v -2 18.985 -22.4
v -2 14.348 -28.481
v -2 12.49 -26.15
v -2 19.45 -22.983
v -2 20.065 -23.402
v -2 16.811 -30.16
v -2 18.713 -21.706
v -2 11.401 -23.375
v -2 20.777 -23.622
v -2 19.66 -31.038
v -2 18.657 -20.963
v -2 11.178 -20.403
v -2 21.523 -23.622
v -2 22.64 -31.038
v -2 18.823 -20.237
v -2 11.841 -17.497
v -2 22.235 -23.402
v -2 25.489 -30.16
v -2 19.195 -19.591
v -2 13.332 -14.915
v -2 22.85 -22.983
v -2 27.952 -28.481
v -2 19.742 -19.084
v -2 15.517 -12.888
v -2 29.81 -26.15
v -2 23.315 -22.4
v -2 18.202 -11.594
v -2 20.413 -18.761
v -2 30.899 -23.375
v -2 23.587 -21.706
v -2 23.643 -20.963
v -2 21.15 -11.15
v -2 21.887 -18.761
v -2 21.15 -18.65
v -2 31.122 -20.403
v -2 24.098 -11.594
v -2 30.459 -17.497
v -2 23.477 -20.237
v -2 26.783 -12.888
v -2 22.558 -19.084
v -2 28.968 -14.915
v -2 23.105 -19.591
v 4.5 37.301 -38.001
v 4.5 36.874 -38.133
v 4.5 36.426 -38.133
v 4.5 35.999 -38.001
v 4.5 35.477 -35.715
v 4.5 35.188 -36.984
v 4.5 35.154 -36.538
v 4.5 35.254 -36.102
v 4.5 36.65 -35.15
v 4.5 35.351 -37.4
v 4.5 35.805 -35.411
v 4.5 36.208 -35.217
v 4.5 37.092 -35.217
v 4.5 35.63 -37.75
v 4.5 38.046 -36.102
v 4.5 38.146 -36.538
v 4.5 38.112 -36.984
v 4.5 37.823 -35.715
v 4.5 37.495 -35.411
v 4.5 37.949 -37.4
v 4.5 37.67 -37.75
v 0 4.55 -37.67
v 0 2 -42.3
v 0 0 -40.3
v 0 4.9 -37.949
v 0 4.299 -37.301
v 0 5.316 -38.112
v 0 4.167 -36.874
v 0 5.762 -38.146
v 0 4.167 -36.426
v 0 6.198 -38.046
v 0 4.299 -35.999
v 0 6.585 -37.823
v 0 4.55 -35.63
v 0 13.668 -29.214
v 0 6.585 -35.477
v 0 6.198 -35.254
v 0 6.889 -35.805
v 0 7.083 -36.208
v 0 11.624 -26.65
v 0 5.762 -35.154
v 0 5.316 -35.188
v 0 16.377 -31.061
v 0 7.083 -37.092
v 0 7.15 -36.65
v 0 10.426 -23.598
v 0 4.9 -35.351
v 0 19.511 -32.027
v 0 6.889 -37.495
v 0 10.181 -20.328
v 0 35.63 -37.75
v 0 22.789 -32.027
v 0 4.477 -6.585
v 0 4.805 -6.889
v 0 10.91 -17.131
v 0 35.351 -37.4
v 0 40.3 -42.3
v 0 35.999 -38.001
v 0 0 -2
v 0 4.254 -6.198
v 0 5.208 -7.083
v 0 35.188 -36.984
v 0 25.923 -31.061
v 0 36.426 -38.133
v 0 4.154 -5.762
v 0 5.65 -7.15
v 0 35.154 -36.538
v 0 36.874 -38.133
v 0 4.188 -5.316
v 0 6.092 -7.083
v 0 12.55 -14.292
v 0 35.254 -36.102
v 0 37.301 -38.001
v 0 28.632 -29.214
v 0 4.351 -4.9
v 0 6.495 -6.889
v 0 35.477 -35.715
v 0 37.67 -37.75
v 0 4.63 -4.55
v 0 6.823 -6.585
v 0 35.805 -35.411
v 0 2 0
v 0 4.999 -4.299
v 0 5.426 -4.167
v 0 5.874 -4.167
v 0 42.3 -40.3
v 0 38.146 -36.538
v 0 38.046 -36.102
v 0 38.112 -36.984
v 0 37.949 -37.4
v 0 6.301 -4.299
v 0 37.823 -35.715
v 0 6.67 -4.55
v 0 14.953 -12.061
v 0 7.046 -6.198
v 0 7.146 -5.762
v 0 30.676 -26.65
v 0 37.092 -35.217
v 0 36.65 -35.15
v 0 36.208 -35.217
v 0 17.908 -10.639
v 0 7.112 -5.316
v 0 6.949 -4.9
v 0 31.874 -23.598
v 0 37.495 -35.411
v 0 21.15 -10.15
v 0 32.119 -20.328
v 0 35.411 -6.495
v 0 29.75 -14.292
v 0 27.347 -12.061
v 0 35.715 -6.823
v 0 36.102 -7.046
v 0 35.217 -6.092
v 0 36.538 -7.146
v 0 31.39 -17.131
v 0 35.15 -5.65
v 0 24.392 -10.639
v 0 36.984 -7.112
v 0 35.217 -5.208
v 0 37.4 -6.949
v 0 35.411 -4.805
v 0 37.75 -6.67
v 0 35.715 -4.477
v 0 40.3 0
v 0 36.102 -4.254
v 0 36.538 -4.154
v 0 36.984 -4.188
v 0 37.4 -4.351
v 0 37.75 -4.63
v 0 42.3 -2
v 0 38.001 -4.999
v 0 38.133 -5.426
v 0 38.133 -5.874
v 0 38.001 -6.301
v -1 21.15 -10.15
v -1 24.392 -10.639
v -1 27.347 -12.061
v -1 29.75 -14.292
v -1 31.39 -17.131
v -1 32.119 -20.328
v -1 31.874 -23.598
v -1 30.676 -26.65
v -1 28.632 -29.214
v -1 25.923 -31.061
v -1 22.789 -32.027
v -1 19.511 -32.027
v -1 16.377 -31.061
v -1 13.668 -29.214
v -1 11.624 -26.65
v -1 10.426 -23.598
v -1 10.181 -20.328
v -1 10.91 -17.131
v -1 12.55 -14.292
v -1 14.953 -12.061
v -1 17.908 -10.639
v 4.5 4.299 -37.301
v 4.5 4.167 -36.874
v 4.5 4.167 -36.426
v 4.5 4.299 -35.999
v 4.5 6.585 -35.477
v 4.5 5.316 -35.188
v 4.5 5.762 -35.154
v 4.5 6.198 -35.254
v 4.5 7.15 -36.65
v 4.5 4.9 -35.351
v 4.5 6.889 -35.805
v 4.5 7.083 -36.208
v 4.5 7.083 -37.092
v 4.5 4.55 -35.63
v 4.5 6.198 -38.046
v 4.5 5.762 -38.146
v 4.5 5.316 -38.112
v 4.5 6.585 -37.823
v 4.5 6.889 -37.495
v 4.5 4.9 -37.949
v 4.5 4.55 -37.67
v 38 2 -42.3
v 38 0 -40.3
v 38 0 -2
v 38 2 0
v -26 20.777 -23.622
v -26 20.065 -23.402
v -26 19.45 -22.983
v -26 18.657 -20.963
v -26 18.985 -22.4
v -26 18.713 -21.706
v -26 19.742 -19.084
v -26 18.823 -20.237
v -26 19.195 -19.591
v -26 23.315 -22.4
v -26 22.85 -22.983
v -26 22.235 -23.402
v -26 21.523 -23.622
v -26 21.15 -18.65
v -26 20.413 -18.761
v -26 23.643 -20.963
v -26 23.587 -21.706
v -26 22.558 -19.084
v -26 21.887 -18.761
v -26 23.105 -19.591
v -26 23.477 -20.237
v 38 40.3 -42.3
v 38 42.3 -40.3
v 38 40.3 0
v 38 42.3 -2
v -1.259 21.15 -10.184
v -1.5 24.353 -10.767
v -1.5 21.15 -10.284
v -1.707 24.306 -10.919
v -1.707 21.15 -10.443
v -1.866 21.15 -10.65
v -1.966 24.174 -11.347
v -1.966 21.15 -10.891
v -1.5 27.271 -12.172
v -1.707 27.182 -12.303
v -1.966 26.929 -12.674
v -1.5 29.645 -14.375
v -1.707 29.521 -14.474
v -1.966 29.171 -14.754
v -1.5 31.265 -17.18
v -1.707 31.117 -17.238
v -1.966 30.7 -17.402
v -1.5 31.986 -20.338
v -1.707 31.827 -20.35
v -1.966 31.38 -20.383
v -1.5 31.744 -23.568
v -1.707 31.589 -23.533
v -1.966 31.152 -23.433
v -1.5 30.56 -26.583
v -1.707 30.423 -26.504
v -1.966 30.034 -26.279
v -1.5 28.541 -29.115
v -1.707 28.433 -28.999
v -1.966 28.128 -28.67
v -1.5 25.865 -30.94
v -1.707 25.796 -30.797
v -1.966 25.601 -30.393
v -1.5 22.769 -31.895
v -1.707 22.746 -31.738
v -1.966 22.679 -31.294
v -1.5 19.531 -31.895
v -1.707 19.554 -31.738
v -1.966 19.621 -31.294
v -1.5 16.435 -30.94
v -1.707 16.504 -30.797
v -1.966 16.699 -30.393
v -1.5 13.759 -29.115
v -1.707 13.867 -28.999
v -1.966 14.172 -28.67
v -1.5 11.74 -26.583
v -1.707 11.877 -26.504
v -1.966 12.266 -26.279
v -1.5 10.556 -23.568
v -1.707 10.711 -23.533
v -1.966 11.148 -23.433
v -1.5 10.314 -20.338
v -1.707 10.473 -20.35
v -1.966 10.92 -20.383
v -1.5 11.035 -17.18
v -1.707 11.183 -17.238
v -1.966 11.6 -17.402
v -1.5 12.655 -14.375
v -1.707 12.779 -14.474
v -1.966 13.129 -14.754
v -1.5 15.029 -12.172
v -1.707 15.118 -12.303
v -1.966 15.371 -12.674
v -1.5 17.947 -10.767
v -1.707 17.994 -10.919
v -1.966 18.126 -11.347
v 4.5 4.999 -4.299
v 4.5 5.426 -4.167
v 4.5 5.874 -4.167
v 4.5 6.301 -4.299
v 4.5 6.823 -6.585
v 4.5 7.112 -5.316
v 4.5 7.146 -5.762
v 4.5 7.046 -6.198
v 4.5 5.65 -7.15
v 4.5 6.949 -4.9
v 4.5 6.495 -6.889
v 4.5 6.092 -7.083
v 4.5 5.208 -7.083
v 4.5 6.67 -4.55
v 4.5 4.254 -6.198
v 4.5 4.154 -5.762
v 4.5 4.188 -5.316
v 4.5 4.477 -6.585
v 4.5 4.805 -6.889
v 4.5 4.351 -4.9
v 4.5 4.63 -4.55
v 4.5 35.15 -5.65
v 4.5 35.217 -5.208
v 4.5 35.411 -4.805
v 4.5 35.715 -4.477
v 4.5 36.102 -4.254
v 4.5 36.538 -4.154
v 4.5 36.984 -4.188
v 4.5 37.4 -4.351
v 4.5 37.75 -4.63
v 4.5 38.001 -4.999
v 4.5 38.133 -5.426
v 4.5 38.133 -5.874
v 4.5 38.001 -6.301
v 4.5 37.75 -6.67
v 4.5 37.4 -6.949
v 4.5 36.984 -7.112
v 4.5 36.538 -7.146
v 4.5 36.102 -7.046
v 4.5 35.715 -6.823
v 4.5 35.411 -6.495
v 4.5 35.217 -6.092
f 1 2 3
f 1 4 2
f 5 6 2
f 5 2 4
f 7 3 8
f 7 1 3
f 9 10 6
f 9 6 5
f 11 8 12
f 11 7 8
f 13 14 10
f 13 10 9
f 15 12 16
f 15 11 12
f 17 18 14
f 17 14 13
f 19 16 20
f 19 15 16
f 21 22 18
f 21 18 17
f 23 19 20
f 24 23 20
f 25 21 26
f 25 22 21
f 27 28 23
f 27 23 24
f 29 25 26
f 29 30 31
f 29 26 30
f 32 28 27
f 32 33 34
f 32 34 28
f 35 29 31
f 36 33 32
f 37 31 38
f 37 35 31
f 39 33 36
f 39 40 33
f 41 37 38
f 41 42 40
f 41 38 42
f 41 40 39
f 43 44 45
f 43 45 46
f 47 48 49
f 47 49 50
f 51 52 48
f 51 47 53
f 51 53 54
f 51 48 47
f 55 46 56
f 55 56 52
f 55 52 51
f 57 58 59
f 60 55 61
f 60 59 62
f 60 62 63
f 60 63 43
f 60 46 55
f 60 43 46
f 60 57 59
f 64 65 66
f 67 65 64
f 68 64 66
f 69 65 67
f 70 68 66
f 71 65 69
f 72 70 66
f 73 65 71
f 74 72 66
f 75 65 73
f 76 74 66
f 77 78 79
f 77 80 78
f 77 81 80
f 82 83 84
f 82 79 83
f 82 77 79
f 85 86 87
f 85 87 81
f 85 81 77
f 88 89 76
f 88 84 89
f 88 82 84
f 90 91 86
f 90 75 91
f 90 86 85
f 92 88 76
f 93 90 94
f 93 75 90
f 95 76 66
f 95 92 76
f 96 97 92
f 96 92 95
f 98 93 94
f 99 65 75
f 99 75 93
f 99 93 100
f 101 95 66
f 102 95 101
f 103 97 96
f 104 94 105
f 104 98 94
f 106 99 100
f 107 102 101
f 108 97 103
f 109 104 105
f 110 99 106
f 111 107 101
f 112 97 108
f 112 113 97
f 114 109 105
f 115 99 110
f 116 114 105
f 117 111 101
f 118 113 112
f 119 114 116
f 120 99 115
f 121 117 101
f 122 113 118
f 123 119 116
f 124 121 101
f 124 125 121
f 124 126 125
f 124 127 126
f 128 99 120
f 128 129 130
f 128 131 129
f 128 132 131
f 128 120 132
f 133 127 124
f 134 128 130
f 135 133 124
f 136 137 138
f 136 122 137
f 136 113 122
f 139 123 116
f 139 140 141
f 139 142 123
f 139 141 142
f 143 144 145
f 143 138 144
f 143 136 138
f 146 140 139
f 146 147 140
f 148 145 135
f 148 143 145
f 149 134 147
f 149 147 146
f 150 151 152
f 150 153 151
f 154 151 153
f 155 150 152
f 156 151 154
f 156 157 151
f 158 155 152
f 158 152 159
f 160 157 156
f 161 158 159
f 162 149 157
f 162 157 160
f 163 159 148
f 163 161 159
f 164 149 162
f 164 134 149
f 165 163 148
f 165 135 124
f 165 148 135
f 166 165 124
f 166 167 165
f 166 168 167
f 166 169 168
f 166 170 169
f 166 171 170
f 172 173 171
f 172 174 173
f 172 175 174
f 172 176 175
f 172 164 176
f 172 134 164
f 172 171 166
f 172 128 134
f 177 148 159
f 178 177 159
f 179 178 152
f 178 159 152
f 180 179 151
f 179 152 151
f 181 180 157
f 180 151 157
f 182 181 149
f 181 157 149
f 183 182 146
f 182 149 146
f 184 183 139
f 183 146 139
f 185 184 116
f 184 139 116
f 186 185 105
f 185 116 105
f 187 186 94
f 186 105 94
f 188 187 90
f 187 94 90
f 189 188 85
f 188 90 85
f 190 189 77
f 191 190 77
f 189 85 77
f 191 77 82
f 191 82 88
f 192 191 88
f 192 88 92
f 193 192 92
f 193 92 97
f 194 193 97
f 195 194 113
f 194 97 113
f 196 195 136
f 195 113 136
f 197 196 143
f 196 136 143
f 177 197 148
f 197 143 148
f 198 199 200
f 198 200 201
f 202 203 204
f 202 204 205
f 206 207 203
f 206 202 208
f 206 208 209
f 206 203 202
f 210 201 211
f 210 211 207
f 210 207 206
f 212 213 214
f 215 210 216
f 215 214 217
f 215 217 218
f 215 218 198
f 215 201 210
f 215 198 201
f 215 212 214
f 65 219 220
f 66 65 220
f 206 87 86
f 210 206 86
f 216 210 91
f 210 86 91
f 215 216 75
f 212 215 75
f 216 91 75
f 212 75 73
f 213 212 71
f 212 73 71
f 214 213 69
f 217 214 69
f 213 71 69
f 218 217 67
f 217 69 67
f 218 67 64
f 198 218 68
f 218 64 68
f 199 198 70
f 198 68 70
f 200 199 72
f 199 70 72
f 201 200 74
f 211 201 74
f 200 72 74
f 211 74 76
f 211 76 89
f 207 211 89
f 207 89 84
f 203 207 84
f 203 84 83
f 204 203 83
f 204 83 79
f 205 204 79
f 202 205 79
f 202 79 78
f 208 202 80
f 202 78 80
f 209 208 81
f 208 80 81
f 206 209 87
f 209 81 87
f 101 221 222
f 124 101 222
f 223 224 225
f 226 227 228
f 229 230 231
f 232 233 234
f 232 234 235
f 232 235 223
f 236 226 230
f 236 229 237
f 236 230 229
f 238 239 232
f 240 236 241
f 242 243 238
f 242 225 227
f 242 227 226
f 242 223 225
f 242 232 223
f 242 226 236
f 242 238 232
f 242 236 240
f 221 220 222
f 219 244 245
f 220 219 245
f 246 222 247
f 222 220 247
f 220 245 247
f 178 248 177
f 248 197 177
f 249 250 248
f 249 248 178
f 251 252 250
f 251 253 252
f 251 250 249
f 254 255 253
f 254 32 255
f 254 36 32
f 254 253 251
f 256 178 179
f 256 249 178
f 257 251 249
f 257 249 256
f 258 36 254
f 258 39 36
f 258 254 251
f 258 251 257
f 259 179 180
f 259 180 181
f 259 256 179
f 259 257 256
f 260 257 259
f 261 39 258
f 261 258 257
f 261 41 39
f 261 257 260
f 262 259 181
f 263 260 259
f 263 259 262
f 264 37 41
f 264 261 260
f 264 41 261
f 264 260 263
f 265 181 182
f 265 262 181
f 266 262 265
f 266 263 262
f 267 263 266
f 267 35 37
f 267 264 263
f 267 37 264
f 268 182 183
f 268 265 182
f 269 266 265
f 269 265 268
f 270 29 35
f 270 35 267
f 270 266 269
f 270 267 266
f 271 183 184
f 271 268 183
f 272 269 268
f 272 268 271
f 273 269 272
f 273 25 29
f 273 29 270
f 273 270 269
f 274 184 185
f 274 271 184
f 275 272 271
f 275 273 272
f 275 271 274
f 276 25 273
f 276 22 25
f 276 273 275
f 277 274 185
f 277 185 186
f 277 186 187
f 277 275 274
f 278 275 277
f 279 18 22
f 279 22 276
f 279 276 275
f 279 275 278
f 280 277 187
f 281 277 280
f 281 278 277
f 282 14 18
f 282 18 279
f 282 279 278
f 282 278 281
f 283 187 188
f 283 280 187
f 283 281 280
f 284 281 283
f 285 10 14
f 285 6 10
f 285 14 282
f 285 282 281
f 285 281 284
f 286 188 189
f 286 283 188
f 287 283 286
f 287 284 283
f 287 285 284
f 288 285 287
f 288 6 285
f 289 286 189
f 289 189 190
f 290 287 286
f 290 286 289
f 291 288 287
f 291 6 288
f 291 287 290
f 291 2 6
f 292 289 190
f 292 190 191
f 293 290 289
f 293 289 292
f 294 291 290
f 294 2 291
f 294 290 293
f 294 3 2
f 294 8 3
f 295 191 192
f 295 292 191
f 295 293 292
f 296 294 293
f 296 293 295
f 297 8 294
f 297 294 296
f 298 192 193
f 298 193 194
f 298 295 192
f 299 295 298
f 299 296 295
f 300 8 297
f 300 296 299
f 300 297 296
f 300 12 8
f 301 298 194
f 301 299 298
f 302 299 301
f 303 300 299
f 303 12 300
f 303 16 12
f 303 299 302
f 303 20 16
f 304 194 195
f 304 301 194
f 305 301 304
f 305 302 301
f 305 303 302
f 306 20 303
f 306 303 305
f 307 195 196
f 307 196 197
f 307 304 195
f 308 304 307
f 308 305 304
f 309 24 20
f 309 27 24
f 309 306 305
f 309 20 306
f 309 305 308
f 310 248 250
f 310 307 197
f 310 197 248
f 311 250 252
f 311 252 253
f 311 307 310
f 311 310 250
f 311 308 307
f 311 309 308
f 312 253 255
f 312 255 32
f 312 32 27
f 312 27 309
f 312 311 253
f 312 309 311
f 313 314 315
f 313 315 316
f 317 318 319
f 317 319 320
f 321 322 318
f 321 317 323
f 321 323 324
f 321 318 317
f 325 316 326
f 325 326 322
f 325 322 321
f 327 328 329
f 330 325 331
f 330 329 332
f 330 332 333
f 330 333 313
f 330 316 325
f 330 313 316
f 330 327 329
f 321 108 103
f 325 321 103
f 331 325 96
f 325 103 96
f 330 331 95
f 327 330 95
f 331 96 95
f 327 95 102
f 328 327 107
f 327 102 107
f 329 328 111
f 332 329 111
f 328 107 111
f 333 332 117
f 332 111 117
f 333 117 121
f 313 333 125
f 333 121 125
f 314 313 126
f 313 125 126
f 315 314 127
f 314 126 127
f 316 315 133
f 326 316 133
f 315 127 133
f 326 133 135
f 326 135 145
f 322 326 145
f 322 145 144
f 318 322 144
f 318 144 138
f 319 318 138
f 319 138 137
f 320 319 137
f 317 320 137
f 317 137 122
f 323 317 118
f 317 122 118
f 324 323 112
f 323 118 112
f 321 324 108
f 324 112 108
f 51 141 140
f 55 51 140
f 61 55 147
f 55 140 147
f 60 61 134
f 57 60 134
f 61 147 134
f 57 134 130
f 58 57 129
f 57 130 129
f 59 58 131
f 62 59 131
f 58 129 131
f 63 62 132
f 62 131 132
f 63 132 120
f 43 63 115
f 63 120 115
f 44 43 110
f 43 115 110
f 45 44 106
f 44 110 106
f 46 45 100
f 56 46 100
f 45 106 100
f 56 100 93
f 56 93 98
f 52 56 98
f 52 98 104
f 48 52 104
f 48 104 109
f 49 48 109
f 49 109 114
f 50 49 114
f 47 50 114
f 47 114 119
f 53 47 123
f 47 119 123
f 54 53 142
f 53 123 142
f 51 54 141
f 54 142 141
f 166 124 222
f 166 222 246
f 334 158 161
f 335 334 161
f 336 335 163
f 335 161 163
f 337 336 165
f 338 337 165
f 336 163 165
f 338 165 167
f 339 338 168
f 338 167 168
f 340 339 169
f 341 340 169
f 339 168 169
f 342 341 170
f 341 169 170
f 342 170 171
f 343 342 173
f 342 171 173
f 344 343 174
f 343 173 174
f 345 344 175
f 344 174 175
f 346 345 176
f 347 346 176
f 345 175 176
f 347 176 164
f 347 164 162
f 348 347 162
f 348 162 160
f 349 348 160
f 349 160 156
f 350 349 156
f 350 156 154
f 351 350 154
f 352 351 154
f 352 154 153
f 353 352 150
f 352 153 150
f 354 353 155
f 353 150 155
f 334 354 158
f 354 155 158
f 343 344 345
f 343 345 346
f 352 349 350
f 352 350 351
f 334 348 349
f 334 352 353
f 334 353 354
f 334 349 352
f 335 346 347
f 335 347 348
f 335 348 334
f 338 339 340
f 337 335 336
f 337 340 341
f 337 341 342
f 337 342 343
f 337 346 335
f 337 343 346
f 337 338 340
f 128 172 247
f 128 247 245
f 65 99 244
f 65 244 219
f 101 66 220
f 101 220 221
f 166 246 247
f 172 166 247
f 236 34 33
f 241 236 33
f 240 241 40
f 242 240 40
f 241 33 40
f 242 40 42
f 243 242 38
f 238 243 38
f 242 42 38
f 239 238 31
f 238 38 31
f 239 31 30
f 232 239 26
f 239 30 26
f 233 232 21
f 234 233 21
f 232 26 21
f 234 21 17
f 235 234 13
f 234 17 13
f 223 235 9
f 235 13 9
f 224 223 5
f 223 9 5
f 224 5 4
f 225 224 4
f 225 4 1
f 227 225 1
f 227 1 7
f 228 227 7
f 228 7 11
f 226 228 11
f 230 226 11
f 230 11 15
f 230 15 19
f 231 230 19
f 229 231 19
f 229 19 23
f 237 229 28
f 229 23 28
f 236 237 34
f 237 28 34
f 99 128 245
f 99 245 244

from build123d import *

# Parameters (mm, degrees)
EXTRUDE_2_DEPTH          = 38
SKETCH_2_R               = 11
EXTRUDE_3_DEPTH          = 2
FILLET_1_R               = 1
SKETCH_3_R               = 2.5
EXTRUDE_4_DEPTH          = 24
SKETCH_4_R               = 1.5
CUT_EXTRUDE_1_DEPTH      = 4.5
PATTERN_CIRCULAR_1_COUNT = 4


with BuildPart() as part:
    # 草图1 → 凸台-拉伸2 (new body)
    with BuildSketch(Plane(origin=(0, 0, 0), x_dir=(0, 0, -1), z_dir=(1, 0, 0))):
        Polygon((0, 40.3), (2, 42.3), (40.3, 42.3), (42.3, 40.3), (42.3, 2), (40.3, 0), (2, 0), (0, 2), align=None)
    extrude(amount=EXTRUDE_2_DEPTH)

    # 草图2 → 凸台-拉伸3 (add)
    with BuildSketch(Plane.ZY):
        with Locations((-21.15, 21.15)):
            Circle(SKETCH_2_R)
    extrude(amount=EXTRUDE_3_DEPTH)

    # 圆角1
    fillet_1_edges = [part.edges().sort_by_distance(p)[0] for p in [
        (-2, 21.15, -32.15),
    ]]
    fillet(fillet_1_edges, radius=FILLET_1_R)

    # 草图3 → 凸台-拉伸4 (add)
    with BuildSketch(Plane.ZY.offset(2)):
        with Locations((-21.15, 21.15)):
            Circle(SKETCH_3_R)
    extrude(amount=EXTRUDE_4_DEPTH)

    # 草图4 → 切除-拉伸1 (cut)
    with BuildSketch(Plane.ZY):
        with Locations((-36.65, 36.65)):
            Circle(SKETCH_4_R)
    cut_extrude_1 = extrude(amount=-CUT_EXTRUDE_1_DEPTH, mode=Mode.SUBTRACT)

    # 阵列(圆周)1: 切除-拉伸1 ×4 about axis
    pattern_circular_1_axis = Axis((0, 21.15, -21.15), (1, 0, 0))
    for i in range(1, PATTERN_CIRCULAR_1_COUNT):
        add(cut_extrude_1.rotate(pattern_circular_1_axis, i * 360 / PATTERN_CIRCULAR_1_COUNT), mode=Mode.SUBTRACT)


solid = part.part
